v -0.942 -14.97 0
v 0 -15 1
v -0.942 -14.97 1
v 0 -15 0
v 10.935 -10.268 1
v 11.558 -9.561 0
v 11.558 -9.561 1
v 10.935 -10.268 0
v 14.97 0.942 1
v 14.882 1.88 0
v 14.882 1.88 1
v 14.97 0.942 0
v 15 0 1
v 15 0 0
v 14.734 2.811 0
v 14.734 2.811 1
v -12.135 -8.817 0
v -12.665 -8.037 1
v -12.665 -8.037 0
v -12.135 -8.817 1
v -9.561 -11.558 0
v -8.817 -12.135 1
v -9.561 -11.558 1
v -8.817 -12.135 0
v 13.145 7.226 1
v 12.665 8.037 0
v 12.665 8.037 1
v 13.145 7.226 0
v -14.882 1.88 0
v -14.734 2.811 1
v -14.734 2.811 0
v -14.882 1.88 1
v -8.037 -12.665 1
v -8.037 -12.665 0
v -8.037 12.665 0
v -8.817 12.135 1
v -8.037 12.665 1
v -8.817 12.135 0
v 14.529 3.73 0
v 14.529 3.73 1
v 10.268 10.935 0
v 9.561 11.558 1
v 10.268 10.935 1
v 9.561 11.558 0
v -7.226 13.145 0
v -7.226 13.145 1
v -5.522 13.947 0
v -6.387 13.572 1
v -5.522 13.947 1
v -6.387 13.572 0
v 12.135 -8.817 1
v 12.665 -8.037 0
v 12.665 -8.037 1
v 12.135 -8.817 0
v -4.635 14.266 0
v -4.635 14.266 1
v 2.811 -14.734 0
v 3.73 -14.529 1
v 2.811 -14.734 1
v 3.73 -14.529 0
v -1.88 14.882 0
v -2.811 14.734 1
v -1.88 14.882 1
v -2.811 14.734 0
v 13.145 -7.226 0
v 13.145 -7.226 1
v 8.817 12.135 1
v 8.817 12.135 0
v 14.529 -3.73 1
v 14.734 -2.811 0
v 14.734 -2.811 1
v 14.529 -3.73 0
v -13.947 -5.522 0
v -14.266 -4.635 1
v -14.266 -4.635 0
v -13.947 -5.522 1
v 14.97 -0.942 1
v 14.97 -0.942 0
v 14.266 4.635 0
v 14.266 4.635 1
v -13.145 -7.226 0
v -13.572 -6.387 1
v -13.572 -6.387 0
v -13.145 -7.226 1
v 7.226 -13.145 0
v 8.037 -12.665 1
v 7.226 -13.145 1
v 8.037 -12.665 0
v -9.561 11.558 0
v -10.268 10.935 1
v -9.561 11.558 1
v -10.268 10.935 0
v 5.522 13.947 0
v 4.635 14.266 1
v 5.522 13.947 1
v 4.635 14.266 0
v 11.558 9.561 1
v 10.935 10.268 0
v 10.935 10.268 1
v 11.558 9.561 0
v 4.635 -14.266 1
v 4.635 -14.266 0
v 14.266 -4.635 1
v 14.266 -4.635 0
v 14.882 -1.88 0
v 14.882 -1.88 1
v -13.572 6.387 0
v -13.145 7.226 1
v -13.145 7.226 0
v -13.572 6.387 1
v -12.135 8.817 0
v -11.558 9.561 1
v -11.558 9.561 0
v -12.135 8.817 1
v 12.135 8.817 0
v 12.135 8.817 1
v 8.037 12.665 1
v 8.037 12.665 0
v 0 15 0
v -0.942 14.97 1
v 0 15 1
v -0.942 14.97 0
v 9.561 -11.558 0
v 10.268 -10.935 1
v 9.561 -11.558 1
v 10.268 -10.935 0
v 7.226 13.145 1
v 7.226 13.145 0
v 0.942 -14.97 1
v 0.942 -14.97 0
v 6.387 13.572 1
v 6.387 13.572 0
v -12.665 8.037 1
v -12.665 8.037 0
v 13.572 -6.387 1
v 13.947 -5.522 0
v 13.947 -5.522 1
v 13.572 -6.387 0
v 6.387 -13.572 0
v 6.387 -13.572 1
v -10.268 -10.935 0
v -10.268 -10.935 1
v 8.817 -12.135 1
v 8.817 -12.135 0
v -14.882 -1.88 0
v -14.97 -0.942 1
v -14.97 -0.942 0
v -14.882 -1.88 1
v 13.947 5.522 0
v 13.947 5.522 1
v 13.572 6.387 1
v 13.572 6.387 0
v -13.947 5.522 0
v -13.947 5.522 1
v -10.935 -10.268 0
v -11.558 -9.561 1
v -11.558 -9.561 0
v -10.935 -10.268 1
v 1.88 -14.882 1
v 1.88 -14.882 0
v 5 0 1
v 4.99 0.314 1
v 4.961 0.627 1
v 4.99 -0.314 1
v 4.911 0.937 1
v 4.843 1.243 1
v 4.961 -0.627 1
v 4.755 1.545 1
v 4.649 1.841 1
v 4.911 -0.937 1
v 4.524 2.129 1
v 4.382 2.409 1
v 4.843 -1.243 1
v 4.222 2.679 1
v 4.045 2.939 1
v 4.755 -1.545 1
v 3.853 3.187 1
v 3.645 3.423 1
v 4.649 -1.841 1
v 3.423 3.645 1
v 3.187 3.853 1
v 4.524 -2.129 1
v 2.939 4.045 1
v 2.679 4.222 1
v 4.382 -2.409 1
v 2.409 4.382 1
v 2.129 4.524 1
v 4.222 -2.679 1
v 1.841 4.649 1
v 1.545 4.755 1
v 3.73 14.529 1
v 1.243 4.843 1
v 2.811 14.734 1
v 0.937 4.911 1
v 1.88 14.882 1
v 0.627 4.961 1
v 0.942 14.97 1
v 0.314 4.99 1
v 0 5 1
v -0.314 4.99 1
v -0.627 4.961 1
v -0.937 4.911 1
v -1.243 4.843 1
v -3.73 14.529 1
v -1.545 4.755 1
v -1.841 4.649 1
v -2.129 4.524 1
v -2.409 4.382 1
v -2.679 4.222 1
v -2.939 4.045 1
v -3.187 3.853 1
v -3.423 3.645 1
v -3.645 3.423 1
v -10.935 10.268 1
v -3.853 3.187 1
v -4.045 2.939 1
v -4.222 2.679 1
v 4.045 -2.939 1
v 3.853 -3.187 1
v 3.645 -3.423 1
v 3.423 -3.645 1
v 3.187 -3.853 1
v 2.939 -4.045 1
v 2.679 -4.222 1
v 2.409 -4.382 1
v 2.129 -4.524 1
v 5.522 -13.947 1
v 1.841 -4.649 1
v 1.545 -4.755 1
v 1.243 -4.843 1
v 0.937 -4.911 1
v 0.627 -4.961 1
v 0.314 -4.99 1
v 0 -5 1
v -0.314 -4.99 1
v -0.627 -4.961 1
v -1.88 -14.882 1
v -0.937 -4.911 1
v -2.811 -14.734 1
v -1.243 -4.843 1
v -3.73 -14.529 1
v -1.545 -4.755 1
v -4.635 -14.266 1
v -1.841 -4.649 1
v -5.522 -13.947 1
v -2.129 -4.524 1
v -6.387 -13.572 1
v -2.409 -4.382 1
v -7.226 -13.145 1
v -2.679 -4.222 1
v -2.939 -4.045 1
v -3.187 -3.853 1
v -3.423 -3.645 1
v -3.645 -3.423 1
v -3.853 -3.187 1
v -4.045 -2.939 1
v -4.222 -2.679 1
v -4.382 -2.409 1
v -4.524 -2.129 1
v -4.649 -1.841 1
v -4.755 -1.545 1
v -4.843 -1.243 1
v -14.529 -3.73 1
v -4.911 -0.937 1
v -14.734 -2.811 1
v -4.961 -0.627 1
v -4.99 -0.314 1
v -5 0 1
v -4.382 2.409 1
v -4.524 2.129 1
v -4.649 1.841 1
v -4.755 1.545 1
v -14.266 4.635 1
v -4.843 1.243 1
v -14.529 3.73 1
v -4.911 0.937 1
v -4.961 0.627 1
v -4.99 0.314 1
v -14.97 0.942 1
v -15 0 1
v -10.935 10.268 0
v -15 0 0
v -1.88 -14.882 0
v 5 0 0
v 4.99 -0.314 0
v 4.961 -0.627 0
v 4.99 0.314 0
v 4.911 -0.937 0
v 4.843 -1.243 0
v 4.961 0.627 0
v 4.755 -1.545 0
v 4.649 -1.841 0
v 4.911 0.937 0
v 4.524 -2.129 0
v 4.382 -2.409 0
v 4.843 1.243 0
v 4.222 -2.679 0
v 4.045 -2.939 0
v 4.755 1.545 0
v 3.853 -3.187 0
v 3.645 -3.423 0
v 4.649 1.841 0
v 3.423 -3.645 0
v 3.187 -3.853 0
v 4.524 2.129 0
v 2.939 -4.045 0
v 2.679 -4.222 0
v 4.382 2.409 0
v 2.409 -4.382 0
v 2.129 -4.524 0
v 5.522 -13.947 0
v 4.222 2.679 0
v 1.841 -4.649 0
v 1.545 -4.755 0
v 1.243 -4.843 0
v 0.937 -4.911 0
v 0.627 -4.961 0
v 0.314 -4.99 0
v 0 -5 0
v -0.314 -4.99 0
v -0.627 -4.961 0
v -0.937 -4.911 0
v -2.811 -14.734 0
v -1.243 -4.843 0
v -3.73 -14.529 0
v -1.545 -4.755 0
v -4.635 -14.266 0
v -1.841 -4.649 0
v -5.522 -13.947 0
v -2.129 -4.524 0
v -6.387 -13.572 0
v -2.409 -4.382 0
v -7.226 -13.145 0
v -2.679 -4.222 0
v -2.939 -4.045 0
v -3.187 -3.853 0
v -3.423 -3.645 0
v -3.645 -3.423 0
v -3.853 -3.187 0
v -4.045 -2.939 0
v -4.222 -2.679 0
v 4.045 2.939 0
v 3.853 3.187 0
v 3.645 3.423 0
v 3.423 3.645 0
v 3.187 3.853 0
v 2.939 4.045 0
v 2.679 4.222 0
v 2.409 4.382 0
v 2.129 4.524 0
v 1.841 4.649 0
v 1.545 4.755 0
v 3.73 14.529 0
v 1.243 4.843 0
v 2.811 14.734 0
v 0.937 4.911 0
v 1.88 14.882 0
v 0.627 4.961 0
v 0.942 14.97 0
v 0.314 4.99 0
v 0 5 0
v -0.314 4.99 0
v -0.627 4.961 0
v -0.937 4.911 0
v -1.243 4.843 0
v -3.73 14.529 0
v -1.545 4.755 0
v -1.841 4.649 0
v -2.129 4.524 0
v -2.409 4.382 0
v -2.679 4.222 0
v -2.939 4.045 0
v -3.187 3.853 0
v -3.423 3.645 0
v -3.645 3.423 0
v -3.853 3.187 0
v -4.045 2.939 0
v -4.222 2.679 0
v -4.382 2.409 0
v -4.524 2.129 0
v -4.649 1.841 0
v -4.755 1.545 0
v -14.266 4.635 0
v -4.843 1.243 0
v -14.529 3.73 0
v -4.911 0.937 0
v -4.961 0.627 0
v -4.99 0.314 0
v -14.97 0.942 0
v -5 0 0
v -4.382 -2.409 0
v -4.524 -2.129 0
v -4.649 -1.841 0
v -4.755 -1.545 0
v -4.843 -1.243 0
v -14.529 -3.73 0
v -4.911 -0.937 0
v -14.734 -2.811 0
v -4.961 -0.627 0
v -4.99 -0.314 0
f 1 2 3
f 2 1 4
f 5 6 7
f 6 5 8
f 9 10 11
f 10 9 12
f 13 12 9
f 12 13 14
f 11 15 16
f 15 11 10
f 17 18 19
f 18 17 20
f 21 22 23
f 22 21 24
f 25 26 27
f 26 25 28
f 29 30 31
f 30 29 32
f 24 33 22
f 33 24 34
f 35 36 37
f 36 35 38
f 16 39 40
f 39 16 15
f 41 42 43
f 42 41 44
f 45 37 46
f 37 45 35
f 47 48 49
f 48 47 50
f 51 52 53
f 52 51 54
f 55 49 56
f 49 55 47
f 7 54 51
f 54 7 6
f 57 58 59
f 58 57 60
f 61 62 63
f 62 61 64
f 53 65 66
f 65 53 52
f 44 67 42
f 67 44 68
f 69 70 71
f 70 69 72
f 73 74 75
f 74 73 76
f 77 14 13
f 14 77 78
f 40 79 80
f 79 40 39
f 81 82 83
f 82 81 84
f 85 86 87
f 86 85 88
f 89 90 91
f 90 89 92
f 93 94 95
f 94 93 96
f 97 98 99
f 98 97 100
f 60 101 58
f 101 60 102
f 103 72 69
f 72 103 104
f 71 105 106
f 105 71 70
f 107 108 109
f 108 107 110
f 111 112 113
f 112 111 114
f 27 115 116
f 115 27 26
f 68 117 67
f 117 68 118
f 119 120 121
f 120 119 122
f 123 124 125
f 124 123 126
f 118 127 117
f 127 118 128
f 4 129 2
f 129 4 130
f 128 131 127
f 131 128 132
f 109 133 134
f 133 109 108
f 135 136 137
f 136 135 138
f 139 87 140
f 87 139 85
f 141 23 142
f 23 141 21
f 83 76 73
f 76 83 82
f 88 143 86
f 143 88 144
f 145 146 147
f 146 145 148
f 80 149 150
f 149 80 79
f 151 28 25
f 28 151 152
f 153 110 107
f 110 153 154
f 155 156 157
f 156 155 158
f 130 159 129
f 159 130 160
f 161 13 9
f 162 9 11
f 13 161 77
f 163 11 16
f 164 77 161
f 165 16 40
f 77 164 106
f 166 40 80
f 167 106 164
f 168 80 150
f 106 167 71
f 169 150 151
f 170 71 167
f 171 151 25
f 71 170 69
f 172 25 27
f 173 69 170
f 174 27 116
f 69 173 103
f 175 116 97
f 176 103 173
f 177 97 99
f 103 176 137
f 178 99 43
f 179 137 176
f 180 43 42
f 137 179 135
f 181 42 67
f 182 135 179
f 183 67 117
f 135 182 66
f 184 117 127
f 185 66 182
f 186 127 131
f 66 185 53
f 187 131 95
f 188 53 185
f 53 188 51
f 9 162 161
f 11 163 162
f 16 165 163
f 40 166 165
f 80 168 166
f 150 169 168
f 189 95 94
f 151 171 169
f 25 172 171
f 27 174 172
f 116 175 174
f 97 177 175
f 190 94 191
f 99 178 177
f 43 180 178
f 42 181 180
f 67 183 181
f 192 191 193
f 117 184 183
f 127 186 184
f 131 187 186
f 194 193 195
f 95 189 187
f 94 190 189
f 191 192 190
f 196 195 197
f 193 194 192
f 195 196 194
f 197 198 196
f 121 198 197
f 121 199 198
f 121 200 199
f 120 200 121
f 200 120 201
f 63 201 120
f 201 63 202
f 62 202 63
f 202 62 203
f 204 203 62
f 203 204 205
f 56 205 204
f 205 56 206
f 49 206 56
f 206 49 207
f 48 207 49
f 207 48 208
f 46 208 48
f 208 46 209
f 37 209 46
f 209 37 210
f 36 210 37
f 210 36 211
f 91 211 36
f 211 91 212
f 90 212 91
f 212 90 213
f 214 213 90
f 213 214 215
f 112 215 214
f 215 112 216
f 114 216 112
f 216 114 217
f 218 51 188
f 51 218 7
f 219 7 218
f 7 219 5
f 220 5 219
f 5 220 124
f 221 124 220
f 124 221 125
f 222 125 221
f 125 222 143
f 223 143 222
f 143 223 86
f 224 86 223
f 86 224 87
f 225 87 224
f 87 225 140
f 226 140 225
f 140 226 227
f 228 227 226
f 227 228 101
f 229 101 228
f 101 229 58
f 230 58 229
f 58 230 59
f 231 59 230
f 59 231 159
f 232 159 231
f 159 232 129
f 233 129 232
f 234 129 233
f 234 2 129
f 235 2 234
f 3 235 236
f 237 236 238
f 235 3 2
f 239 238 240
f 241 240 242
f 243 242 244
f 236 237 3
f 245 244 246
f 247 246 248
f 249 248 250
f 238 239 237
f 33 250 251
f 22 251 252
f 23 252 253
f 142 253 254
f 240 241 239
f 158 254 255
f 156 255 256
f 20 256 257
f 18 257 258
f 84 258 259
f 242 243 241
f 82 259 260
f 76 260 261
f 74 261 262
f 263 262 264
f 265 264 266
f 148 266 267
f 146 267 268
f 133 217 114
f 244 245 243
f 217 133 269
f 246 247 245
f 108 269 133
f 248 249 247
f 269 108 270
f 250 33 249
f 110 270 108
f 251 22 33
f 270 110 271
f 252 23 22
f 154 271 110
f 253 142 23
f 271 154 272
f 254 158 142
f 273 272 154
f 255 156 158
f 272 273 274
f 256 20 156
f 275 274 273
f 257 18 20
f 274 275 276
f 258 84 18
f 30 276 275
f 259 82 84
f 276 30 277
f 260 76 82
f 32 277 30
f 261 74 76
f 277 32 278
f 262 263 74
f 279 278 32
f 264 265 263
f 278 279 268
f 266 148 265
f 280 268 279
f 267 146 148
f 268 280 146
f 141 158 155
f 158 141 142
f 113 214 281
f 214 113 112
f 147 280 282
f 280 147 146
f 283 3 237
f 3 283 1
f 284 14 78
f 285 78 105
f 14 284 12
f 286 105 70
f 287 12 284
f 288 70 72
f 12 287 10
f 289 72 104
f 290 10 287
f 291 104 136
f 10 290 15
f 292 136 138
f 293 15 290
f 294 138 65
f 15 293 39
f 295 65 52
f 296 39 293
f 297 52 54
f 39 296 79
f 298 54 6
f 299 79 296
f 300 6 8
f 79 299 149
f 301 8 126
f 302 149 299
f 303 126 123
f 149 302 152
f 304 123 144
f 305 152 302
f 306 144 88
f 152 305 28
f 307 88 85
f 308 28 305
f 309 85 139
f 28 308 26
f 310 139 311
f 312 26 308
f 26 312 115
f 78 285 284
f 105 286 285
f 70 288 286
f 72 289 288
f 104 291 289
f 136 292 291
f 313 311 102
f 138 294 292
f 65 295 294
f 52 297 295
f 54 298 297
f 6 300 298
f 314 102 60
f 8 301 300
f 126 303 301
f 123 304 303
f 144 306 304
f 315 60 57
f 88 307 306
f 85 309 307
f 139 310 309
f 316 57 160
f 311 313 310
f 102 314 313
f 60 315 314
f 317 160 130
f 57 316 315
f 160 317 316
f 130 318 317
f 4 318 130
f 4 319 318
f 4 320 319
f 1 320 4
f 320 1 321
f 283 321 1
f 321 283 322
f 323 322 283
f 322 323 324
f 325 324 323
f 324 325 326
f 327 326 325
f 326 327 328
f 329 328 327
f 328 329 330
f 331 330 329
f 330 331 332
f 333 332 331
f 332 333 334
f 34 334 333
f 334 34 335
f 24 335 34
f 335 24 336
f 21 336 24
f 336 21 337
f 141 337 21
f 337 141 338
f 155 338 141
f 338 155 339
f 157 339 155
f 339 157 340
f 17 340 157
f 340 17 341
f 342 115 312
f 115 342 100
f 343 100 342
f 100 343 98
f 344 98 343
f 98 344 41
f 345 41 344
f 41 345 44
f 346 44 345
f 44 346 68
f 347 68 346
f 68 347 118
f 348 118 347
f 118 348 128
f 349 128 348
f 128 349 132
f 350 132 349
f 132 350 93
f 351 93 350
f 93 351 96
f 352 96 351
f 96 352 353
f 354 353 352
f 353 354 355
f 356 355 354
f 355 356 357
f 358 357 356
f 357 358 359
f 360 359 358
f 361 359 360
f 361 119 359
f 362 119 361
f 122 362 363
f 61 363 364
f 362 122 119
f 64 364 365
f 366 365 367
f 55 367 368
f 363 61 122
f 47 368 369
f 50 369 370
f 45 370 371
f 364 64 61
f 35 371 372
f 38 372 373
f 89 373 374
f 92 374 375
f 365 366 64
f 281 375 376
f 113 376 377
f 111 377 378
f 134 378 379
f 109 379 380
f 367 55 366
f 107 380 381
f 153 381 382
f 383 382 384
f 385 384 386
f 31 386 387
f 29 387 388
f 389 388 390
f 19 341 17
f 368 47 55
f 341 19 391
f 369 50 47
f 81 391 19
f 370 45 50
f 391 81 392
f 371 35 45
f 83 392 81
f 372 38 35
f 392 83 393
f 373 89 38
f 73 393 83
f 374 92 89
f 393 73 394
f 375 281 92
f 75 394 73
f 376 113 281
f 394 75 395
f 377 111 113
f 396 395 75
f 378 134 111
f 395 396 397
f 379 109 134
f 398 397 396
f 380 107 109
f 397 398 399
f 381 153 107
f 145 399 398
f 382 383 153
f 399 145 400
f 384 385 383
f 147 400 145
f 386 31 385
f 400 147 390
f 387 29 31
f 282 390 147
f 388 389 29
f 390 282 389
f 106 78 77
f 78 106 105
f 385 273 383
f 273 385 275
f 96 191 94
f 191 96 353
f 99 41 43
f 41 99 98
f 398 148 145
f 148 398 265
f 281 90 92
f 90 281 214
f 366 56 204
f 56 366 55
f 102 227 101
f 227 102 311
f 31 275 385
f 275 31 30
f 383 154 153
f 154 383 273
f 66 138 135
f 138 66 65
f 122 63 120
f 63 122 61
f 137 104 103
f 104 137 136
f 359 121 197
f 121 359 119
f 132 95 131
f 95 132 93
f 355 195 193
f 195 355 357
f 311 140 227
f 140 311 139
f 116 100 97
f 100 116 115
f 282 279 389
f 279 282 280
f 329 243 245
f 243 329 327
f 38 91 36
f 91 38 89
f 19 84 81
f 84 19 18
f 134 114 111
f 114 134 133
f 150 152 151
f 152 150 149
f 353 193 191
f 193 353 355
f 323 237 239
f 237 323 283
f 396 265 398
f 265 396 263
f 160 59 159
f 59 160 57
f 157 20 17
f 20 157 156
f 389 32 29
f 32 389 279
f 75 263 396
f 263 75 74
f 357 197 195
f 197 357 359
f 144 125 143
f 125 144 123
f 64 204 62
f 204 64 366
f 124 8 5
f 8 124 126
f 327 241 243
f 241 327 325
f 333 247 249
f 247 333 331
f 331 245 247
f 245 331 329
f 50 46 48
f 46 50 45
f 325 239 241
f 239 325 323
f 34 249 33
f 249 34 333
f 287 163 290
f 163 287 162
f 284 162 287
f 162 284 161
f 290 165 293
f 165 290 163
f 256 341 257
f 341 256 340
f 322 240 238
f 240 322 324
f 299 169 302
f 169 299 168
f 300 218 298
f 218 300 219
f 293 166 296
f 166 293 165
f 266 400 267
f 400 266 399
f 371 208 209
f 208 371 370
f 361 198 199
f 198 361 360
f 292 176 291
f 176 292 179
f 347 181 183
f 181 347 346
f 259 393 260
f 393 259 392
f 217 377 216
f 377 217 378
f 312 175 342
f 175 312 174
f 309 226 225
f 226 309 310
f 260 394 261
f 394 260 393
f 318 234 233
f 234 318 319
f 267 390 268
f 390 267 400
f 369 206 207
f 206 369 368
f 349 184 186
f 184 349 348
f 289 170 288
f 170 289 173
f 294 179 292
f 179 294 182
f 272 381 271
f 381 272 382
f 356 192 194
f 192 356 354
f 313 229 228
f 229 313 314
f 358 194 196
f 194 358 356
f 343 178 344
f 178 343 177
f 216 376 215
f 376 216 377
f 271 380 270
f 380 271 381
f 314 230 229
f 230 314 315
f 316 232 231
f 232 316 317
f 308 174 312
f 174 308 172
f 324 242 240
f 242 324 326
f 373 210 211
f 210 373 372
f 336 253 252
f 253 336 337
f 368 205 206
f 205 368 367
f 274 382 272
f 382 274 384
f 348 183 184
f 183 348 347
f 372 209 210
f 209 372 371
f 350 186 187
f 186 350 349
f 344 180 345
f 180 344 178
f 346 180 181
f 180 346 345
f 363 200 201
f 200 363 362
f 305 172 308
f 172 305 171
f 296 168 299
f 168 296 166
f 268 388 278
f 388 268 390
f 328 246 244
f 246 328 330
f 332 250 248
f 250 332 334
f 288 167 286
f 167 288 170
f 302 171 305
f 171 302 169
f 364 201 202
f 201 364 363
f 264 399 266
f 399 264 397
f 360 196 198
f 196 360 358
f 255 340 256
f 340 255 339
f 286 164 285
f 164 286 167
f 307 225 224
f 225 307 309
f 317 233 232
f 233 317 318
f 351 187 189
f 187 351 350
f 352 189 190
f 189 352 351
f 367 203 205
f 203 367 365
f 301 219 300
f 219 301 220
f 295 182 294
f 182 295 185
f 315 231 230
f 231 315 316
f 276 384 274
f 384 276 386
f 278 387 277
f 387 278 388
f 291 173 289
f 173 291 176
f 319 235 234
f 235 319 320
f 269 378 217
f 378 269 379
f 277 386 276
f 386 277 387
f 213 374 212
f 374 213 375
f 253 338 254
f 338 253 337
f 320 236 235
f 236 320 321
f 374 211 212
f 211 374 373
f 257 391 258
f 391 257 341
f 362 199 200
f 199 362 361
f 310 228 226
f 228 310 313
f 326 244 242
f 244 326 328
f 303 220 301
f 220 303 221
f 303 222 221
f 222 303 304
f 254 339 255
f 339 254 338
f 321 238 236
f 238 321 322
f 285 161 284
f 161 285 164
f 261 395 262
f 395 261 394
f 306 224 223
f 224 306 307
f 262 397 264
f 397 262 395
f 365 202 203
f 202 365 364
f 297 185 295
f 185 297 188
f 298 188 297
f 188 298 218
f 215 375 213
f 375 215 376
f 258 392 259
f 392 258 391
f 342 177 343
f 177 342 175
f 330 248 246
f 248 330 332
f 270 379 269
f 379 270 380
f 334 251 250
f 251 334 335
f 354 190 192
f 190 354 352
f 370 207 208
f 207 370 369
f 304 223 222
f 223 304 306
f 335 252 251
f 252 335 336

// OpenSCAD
$fn=100;
difference() {
 cylinder(d=30, h=1);
 cylinder(d=10, h=1.5);
}
